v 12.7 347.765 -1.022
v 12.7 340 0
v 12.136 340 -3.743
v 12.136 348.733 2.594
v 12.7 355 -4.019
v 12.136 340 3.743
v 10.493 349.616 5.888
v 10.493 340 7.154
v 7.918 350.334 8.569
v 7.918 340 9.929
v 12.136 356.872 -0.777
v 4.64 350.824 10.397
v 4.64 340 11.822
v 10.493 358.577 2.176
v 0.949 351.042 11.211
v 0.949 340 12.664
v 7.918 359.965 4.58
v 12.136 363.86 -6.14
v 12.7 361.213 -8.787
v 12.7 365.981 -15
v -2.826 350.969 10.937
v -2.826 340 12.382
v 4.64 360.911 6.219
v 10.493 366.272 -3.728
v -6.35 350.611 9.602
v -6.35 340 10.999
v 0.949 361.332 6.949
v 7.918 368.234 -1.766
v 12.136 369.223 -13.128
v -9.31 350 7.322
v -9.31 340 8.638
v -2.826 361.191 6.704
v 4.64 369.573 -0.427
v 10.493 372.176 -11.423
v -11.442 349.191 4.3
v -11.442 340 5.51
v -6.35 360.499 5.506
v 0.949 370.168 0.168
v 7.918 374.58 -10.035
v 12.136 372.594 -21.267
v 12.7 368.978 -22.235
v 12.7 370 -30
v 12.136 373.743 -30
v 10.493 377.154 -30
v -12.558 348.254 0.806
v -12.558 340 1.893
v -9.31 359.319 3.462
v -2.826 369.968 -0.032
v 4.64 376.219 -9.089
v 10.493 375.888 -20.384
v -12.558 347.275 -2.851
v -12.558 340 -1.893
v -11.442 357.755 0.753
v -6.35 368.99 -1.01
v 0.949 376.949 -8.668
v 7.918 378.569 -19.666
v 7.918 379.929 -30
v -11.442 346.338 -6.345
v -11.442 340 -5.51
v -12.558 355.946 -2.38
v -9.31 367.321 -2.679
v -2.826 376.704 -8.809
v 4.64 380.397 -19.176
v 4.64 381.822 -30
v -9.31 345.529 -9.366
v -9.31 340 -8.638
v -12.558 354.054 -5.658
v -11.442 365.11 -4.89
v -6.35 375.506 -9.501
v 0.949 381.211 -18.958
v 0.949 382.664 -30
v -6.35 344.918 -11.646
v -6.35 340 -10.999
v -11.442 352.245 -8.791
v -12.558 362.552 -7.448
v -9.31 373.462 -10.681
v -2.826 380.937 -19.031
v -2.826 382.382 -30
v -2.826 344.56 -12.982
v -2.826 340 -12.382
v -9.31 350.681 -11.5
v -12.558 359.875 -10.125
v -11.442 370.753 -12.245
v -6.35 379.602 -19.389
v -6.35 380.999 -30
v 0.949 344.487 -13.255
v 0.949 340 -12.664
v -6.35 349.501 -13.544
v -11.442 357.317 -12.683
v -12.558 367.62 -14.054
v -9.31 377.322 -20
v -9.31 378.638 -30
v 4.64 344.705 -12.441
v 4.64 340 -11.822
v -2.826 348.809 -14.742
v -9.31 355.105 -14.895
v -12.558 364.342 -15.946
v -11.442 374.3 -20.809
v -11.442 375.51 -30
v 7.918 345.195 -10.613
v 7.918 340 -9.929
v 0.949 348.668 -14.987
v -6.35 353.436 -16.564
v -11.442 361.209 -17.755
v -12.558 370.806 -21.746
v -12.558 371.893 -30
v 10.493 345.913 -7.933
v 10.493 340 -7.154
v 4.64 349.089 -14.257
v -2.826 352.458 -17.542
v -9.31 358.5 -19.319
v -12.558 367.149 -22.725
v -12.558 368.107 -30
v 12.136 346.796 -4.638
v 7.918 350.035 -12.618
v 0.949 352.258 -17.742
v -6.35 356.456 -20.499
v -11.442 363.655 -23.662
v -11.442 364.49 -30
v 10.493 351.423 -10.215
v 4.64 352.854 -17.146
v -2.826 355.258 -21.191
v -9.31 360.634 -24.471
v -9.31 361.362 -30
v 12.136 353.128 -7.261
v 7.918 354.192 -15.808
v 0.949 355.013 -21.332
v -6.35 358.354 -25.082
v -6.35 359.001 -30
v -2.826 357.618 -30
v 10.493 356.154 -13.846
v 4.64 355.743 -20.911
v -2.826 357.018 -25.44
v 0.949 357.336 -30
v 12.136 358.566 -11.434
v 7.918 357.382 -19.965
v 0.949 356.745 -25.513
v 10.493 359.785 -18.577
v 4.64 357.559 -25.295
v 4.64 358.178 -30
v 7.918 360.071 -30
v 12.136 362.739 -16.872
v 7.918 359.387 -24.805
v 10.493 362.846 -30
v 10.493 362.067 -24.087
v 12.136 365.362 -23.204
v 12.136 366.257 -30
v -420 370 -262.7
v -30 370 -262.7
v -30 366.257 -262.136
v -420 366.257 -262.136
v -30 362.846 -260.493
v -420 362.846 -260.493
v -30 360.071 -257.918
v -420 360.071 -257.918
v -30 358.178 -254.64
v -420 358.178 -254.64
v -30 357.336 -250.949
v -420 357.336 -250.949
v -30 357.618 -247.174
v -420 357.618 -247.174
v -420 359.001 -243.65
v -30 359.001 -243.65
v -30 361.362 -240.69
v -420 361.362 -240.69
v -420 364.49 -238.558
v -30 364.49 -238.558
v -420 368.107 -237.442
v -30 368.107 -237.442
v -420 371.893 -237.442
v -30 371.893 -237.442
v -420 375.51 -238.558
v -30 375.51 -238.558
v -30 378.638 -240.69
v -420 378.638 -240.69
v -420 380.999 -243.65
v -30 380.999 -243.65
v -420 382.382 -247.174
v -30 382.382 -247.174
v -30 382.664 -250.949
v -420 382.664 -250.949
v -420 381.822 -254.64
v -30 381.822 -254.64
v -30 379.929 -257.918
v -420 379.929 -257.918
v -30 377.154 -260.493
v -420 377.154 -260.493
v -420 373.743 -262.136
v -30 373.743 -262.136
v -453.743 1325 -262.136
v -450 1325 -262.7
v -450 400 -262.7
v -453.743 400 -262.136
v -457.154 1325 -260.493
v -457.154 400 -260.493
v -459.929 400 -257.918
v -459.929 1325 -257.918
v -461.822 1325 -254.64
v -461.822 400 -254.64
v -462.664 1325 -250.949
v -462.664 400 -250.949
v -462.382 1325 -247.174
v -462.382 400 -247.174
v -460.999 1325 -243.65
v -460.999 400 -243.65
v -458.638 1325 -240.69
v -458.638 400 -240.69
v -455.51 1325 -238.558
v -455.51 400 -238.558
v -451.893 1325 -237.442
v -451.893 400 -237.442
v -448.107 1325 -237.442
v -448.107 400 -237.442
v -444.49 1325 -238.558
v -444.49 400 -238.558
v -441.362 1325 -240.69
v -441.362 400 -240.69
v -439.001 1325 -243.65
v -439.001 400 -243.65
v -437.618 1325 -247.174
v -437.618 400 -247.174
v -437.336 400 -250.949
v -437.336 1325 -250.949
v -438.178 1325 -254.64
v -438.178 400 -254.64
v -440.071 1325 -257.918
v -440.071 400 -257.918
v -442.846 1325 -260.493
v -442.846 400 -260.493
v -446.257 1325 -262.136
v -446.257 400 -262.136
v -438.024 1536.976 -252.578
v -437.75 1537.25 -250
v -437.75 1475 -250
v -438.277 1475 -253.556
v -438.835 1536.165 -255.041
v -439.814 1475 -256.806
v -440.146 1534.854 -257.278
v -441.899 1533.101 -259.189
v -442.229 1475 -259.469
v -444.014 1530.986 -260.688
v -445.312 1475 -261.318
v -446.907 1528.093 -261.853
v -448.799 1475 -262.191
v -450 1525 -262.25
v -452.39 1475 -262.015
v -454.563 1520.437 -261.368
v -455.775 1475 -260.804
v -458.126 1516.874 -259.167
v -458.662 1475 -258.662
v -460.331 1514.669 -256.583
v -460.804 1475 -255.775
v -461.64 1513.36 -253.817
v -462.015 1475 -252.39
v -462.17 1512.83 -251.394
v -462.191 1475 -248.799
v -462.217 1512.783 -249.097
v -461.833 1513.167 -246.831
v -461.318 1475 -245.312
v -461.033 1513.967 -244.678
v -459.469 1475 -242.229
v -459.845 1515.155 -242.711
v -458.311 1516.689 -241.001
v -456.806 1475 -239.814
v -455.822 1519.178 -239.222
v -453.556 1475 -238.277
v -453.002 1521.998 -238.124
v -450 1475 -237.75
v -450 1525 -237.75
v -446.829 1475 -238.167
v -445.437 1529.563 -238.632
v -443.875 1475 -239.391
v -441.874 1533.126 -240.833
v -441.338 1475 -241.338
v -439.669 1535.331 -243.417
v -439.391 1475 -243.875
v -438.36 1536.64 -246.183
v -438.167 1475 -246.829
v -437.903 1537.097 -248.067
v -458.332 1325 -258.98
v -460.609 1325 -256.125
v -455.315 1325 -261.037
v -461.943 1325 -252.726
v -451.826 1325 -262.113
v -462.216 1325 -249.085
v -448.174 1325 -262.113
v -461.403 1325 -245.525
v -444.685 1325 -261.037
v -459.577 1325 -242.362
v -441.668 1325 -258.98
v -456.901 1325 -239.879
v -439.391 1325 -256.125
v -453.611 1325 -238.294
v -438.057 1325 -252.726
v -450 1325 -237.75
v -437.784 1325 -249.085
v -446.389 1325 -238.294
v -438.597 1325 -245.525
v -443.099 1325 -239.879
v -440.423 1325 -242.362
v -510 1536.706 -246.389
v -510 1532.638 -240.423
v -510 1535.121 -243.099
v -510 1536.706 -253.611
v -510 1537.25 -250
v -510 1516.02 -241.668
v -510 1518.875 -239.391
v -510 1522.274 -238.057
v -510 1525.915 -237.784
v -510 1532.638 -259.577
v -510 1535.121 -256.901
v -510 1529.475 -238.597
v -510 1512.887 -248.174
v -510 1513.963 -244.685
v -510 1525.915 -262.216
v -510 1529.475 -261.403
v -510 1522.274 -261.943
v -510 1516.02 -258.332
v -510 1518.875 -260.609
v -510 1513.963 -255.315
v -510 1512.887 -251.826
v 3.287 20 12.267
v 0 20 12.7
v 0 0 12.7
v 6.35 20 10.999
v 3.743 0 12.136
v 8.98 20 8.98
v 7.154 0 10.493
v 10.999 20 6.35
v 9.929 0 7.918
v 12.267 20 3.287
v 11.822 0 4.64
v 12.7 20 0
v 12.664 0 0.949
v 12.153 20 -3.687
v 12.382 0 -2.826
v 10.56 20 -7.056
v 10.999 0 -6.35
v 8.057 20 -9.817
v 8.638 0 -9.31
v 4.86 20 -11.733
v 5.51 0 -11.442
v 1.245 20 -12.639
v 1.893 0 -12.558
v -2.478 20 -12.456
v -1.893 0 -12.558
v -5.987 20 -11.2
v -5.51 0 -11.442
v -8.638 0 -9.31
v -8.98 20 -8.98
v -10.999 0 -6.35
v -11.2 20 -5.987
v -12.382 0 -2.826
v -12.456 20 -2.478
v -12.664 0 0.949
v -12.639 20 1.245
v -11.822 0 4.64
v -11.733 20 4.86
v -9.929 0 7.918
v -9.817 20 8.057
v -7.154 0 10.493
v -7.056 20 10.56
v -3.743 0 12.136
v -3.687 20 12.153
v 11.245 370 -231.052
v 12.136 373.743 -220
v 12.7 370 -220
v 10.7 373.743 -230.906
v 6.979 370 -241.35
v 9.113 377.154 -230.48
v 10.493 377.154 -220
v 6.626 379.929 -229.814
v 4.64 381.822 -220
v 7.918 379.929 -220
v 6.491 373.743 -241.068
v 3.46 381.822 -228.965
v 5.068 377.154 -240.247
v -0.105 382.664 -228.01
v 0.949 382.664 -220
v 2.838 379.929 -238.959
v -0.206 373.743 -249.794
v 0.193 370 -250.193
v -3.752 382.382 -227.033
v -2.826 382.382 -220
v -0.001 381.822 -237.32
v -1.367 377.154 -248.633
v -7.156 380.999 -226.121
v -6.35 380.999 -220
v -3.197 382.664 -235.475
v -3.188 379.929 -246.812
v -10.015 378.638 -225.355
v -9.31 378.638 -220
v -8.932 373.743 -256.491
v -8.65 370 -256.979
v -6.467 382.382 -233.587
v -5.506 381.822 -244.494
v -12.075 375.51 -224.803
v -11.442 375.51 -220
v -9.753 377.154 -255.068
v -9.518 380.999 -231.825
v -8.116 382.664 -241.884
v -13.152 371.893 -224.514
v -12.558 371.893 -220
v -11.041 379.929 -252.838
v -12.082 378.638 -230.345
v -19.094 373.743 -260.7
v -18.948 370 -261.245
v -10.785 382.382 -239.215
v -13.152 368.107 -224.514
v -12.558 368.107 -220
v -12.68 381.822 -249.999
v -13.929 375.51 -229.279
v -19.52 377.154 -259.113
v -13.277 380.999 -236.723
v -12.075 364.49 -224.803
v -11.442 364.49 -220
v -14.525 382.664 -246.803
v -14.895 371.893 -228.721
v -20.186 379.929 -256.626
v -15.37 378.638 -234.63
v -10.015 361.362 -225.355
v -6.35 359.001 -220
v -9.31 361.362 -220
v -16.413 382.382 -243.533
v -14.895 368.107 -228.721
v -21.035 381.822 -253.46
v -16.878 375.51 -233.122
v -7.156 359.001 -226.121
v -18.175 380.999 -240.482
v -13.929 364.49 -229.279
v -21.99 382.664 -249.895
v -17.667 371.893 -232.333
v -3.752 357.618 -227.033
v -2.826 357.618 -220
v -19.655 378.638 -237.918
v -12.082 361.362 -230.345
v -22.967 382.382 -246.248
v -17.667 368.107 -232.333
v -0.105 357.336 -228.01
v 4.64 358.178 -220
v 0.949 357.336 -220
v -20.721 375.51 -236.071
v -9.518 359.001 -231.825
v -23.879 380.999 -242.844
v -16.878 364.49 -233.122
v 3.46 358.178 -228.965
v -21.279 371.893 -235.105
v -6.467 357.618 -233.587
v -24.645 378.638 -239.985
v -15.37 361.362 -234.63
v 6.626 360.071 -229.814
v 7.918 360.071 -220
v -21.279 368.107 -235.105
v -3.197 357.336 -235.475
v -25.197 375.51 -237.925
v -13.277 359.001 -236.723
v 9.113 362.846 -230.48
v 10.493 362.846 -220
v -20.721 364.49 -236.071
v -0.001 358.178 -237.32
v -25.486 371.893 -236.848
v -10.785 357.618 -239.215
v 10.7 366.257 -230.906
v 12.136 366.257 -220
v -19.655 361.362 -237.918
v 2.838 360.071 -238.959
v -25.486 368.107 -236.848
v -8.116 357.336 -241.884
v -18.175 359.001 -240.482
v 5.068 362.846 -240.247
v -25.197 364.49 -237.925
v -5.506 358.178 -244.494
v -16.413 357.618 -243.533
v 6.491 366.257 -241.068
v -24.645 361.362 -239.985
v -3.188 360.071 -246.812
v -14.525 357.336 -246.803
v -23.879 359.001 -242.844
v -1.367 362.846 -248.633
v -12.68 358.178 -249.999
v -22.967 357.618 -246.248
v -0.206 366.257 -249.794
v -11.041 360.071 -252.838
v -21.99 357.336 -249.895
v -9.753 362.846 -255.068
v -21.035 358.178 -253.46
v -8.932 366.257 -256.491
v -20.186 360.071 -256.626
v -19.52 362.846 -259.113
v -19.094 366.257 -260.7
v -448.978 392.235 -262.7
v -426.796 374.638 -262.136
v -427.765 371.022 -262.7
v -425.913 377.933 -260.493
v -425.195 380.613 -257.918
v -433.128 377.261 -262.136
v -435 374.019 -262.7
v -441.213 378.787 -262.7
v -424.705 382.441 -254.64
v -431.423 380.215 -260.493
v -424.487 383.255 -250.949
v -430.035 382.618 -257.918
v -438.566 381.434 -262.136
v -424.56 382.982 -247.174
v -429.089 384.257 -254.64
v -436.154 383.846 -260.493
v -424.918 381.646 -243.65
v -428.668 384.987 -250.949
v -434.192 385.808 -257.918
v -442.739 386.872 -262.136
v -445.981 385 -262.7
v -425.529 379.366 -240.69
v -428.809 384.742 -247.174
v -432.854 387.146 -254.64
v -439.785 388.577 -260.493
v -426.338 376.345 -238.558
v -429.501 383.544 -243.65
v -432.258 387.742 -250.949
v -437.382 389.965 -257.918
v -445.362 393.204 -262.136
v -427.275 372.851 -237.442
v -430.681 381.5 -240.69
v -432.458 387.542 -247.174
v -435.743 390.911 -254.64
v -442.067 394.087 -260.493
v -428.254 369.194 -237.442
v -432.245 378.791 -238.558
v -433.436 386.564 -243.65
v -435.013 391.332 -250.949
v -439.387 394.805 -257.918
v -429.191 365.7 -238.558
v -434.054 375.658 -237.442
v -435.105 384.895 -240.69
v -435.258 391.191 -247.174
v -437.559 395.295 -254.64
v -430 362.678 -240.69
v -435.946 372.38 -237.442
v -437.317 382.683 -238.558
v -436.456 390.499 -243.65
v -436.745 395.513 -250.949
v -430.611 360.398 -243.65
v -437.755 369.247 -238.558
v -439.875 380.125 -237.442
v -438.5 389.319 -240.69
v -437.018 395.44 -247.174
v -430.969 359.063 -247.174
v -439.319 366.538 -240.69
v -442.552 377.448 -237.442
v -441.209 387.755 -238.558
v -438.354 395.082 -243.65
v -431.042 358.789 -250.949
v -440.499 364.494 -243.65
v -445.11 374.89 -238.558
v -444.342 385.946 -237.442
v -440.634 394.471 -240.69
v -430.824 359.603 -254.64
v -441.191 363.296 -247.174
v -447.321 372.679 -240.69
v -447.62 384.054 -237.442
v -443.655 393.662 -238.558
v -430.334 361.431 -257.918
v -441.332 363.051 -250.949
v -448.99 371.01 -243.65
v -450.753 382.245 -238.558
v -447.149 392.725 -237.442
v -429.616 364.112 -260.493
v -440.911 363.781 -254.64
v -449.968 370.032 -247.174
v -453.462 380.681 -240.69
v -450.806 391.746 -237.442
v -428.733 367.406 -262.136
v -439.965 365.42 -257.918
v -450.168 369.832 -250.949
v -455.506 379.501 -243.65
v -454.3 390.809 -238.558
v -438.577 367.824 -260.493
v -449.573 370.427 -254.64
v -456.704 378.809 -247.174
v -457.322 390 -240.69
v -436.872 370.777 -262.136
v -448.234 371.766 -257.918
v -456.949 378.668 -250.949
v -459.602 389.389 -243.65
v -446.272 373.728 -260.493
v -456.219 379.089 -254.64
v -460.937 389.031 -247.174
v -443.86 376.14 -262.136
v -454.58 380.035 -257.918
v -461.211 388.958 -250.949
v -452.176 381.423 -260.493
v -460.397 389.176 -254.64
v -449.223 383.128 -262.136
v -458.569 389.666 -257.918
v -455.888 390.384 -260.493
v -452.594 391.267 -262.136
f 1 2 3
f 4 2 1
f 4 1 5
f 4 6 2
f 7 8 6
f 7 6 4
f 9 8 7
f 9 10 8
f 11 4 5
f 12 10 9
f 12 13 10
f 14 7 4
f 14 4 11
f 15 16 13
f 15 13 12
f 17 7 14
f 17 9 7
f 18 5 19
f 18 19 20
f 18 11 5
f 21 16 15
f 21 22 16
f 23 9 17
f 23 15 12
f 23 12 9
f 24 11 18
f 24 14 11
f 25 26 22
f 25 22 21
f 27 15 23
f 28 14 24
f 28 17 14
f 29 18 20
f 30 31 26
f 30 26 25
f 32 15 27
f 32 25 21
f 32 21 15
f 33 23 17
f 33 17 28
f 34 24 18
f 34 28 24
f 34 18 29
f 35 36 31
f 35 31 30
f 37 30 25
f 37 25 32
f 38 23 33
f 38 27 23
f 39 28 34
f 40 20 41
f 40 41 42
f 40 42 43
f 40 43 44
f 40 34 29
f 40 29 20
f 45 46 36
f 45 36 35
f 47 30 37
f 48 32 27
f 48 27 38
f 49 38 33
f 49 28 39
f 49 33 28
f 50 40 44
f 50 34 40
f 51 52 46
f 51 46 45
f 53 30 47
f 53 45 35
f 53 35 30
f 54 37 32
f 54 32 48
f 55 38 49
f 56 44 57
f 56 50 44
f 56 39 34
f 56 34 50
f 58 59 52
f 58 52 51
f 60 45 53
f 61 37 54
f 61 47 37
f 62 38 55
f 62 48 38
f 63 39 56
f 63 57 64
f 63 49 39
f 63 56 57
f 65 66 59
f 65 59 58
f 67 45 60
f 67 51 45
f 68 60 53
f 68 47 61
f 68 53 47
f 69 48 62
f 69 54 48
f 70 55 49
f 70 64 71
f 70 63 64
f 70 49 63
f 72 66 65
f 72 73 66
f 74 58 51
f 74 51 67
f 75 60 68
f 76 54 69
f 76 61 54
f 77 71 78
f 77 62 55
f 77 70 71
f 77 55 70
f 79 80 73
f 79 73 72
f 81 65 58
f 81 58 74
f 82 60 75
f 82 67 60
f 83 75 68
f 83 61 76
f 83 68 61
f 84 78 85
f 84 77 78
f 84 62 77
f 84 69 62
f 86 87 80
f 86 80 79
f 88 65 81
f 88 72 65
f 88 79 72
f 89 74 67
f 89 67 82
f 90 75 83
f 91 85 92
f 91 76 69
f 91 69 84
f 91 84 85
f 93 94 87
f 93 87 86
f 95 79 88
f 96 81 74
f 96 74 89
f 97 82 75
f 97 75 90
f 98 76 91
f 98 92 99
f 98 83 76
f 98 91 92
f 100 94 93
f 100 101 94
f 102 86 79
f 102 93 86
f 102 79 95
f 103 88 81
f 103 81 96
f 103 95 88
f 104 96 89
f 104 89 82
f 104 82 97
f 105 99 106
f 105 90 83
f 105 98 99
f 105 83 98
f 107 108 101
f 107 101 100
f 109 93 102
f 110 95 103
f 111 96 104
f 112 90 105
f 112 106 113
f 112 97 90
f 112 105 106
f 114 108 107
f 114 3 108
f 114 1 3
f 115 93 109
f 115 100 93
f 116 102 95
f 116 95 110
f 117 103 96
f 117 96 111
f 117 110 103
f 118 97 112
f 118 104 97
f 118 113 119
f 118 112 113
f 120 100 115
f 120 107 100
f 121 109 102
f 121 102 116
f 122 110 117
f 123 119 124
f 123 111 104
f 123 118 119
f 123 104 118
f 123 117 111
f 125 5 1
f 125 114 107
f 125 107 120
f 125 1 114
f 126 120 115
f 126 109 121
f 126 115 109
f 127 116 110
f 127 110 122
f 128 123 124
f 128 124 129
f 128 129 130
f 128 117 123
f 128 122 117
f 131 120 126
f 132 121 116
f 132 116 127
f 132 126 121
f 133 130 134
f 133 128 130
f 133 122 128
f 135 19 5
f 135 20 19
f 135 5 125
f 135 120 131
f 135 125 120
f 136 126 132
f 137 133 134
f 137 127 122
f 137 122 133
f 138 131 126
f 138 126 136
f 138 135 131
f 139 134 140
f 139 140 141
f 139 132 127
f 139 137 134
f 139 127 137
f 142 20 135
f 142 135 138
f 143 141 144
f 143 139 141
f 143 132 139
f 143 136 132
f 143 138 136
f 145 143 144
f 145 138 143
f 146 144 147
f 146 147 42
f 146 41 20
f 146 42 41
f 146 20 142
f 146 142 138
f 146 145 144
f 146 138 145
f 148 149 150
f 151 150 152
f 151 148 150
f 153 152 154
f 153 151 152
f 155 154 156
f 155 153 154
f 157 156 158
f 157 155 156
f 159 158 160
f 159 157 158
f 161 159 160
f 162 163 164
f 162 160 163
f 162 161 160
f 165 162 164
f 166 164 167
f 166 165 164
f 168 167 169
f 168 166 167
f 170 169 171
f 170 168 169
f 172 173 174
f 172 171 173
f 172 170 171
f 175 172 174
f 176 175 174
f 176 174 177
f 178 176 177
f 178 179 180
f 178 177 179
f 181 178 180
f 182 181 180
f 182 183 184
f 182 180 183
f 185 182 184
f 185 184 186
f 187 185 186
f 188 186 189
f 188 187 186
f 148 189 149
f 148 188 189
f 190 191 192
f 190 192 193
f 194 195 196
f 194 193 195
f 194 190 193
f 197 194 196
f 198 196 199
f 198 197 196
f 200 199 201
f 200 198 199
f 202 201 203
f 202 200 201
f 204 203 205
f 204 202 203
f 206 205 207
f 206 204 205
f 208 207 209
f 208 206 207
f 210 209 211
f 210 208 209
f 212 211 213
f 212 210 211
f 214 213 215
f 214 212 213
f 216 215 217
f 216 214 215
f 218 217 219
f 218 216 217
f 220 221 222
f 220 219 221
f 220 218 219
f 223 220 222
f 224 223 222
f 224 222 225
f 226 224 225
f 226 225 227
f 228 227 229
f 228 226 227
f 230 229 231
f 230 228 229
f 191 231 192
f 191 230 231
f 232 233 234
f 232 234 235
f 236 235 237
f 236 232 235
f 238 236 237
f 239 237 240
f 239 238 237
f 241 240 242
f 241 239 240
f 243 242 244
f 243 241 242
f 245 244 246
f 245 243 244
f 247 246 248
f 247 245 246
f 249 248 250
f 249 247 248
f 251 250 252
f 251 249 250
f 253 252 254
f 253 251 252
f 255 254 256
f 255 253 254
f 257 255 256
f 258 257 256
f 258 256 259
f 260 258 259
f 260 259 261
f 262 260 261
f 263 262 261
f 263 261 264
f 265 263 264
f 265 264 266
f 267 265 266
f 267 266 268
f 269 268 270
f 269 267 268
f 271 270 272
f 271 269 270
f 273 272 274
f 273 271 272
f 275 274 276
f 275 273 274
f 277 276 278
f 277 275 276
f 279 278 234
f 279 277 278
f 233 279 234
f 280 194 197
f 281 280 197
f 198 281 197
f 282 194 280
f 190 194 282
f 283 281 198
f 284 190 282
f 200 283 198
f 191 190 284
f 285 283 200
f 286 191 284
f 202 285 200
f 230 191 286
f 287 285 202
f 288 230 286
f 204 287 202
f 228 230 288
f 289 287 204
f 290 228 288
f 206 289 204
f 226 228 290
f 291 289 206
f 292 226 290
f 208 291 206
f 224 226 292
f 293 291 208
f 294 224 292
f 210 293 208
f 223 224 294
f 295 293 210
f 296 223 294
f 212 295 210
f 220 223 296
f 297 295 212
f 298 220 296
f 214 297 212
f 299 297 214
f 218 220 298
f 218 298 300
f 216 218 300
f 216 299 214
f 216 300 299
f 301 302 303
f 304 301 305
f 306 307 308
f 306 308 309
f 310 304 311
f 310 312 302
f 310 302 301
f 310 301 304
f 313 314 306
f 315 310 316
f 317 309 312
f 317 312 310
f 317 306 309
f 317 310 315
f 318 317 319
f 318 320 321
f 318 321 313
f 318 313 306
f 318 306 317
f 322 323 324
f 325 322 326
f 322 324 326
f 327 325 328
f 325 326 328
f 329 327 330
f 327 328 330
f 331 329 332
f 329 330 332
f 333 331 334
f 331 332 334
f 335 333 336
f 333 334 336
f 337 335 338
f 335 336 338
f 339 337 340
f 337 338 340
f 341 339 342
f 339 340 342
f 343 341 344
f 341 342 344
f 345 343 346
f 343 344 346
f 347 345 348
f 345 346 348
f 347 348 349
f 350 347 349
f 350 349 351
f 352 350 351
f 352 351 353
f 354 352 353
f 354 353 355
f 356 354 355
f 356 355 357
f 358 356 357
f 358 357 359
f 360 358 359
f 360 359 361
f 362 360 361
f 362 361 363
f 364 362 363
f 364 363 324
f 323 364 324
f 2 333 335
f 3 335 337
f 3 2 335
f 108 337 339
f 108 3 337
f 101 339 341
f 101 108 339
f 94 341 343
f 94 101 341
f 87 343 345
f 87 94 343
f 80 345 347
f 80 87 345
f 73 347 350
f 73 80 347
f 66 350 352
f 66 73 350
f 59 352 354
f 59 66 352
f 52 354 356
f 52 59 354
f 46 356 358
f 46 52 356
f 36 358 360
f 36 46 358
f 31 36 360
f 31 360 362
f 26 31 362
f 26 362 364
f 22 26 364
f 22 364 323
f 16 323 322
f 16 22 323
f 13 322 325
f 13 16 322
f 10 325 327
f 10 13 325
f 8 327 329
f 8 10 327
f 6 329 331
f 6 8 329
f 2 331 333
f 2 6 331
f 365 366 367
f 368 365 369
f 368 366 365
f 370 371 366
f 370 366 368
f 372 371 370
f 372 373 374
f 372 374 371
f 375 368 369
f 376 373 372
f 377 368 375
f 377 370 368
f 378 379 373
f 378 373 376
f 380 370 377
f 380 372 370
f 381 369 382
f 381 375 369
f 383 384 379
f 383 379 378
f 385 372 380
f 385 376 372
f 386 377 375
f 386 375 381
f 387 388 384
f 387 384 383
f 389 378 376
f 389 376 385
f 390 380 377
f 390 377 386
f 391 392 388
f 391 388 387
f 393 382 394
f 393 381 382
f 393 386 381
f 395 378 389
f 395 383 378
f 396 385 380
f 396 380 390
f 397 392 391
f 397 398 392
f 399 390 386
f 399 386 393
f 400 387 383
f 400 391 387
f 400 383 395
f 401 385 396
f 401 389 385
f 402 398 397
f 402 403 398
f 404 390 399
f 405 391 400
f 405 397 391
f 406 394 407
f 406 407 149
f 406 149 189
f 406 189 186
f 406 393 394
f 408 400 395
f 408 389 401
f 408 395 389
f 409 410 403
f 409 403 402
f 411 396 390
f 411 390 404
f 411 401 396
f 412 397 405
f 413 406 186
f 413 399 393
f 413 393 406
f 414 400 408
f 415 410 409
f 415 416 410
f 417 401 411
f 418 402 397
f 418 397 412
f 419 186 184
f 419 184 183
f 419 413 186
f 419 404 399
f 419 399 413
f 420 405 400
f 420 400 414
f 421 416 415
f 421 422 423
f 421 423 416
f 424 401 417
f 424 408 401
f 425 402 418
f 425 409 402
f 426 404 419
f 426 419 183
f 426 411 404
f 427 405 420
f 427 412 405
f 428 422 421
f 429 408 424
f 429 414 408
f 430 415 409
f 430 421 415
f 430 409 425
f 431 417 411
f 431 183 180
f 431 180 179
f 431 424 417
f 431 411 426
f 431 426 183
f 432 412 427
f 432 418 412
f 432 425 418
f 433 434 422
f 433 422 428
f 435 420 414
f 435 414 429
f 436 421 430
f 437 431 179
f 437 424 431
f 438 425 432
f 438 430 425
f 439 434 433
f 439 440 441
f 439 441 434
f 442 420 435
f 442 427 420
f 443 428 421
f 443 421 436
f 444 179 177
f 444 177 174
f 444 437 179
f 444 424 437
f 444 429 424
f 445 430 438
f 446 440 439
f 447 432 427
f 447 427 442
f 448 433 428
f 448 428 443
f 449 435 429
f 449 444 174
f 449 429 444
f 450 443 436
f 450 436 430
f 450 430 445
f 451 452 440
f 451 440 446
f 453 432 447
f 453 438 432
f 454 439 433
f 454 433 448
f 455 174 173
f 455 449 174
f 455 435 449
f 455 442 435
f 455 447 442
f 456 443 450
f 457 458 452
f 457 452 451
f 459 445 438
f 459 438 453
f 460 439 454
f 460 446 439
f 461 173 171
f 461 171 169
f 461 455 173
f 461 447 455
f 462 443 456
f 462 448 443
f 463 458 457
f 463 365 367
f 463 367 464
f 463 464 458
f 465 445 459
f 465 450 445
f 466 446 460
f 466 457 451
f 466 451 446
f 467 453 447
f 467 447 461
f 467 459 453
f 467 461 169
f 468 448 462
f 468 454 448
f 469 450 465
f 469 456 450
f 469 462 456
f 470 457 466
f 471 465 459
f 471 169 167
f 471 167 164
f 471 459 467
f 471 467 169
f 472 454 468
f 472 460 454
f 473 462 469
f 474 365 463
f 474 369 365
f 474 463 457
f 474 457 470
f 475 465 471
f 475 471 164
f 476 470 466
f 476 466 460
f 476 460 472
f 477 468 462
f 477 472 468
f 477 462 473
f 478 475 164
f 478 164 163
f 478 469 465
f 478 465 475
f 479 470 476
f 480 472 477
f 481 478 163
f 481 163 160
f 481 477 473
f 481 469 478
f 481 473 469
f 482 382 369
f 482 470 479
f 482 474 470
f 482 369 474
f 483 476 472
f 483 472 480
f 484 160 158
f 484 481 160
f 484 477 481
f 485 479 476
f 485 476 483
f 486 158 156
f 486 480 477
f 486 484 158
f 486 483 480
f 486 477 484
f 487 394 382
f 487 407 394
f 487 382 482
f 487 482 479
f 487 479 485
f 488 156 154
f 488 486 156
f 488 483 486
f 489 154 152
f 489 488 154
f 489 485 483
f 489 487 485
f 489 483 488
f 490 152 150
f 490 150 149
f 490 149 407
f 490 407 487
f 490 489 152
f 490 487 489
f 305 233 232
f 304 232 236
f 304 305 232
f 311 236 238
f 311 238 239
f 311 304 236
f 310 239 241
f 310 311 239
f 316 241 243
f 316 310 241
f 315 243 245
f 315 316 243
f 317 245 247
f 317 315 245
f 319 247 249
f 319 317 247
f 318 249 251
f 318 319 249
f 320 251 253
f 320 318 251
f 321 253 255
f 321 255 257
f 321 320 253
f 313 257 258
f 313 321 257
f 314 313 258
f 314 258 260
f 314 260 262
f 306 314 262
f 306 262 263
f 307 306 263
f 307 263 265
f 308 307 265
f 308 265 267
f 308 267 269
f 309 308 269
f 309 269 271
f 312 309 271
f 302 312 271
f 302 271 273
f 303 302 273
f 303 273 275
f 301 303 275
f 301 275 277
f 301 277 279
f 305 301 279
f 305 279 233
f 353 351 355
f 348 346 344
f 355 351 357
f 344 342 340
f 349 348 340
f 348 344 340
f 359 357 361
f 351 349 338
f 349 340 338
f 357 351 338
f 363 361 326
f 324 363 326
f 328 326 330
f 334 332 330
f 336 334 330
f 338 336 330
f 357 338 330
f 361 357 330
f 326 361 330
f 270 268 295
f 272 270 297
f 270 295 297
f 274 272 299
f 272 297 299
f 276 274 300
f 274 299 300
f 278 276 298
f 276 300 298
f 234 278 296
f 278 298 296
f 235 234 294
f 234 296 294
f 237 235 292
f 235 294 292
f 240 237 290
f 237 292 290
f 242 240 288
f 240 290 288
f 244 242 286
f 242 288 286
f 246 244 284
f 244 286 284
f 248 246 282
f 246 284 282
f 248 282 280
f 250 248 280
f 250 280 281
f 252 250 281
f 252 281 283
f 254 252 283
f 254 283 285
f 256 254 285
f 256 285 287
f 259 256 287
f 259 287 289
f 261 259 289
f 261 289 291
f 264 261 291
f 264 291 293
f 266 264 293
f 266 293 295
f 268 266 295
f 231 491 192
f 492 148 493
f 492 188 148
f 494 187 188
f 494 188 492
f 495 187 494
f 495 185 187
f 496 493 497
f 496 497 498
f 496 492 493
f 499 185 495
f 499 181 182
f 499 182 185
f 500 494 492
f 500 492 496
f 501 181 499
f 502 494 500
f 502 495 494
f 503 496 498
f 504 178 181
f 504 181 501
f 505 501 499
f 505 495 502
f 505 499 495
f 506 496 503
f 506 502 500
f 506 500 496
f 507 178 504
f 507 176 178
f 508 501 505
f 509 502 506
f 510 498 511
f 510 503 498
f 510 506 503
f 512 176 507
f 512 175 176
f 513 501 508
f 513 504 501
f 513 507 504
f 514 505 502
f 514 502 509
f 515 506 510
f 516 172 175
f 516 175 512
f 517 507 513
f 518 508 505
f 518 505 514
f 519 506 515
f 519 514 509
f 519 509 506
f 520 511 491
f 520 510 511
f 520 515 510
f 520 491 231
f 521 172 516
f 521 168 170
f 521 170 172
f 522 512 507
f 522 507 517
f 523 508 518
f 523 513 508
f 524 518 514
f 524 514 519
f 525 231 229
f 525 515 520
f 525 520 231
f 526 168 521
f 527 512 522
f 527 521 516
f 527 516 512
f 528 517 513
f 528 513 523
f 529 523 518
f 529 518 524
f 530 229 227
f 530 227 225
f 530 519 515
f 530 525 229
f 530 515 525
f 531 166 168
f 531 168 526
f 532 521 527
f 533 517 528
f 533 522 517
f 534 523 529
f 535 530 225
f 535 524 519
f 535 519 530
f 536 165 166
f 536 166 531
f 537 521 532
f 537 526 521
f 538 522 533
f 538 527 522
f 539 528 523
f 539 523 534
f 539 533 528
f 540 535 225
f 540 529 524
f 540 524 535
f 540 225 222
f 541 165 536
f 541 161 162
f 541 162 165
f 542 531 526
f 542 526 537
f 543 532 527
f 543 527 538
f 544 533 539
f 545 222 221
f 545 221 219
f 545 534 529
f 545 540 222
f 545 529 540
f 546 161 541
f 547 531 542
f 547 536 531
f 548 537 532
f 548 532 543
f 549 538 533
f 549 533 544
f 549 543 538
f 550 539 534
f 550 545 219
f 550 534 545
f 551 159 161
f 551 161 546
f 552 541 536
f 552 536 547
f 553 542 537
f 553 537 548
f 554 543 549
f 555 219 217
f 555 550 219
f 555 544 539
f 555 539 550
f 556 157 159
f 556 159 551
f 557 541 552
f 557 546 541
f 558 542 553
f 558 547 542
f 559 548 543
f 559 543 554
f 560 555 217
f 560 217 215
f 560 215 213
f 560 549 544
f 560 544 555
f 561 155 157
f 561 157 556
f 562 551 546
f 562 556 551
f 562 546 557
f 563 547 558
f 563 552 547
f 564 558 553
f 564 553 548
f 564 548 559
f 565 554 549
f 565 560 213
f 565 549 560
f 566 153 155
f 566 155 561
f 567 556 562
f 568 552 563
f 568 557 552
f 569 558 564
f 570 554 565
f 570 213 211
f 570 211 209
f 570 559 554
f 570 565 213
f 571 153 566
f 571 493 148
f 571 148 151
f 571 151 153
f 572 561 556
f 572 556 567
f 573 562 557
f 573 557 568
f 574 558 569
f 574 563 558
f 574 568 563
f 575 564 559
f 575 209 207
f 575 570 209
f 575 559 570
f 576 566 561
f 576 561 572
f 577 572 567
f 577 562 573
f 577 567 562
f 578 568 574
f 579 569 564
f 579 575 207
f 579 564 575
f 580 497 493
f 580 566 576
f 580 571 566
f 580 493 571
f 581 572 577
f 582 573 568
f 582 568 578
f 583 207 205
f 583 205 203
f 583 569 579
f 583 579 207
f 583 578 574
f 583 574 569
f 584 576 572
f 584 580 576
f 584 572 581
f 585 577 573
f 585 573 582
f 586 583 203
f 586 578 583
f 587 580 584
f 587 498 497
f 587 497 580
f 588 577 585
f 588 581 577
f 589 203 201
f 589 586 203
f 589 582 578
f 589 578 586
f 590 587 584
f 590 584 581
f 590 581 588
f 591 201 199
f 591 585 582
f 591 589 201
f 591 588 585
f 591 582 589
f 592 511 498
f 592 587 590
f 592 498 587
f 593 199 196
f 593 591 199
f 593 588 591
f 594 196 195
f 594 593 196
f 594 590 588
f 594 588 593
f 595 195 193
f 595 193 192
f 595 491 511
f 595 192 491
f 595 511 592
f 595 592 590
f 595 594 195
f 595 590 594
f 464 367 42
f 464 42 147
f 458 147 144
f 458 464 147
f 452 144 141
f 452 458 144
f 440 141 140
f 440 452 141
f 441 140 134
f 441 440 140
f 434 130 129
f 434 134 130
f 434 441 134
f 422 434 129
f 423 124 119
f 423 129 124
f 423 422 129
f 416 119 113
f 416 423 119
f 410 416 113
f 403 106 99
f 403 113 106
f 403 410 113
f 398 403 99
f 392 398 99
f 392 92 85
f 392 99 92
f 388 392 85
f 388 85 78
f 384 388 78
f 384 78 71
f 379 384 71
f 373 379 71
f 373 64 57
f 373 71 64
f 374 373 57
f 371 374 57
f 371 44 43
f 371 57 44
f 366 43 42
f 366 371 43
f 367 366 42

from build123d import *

# Parameters (mm, degrees)
CROQUIS1_R              = 12.7
SALIENTE_EXTRUIR1_DEPTH = 20
CROQUIS2_R              = 12.7
CROQUIS3_R              = 12.25
SALIENTE_EXTRUIR2_DEPTH = 150
CROQUIS4_R              = 12.25


with BuildPart() as part:
    # Croquis1 → Saliente-Extruir1 (new body)
    with BuildSketch(Plane(origin=(0, 0, 0), x_dir=(1, 0, 0), z_dir=(0, 1, 0))):
        with Locations(Location((0, 0, 0), (0, 0, 270))):
            Circle(CROQUIS1_R)
    extrude(amount=SALIENTE_EXTRUIR1_DEPTH)

    # Barrer1: sweep along a curve in space
    with BuildLine() as barrer1_path:
        Line((0, 20, 0), (0, 340, 0))
        ThreePointArc((0, 340, 0), (0, 361.213203436, -8.786796564), (0, 370, -30))
        Line((0, 370, -30), (0, 370, -220))
        ThreePointArc((0, 370, -220), (-8.786796564, 370, -241.213203436), (-30, 370, -250))
        Line((-30, 370, -250), (-420, 370, -250))
        ThreePointArc((-420, 370, -250), (-441.213203436, 378.786796564, -250), (-450, 400, -250))
        Line((-450, 400, -250), (-450, 1325, -250))
    # Croquis2 → Barrer1 (sweep)
    with BuildSketch(Plane(origin=(0, 20, 0), x_dir=(1, 0, 0), z_dir=(0, 1, 0))):
        Circle(CROQUIS2_R)
    sweep(path=barrer1_path.line)

    # Croquis3 → Saliente-Extruir2 (add)
    with BuildSketch(Plane(origin=(0, 1325, 0), x_dir=(1, 0, 0), z_dir=(0, 1, 0))):
        with Locations(Location((-450, 250, 0), (0, 0, 270))):
            Circle(CROQUIS3_R)
    extrude(amount=SALIENTE_EXTRUIR2_DEPTH)

    # Barrer2: sweep along a curve in space
    with BuildLine() as barrer2_path:
        Line((-450, 1475, -250), (-450, 1525, -250))
        Line((-450, 1525, -250), (-510, 1525, -250))
    # Croquis4 → Barrer2 (sweep)
    with BuildSketch(Plane(origin=(0, 1475, 0), x_dir=(1, 0, 0), z_dir=(0, 1, 0))):
        with Locations((-450, 250)):
            Circle(CROQUIS4_R)
    sweep(path=barrer2_path.line, transition=Transition.RIGHT)


solid = part.part
